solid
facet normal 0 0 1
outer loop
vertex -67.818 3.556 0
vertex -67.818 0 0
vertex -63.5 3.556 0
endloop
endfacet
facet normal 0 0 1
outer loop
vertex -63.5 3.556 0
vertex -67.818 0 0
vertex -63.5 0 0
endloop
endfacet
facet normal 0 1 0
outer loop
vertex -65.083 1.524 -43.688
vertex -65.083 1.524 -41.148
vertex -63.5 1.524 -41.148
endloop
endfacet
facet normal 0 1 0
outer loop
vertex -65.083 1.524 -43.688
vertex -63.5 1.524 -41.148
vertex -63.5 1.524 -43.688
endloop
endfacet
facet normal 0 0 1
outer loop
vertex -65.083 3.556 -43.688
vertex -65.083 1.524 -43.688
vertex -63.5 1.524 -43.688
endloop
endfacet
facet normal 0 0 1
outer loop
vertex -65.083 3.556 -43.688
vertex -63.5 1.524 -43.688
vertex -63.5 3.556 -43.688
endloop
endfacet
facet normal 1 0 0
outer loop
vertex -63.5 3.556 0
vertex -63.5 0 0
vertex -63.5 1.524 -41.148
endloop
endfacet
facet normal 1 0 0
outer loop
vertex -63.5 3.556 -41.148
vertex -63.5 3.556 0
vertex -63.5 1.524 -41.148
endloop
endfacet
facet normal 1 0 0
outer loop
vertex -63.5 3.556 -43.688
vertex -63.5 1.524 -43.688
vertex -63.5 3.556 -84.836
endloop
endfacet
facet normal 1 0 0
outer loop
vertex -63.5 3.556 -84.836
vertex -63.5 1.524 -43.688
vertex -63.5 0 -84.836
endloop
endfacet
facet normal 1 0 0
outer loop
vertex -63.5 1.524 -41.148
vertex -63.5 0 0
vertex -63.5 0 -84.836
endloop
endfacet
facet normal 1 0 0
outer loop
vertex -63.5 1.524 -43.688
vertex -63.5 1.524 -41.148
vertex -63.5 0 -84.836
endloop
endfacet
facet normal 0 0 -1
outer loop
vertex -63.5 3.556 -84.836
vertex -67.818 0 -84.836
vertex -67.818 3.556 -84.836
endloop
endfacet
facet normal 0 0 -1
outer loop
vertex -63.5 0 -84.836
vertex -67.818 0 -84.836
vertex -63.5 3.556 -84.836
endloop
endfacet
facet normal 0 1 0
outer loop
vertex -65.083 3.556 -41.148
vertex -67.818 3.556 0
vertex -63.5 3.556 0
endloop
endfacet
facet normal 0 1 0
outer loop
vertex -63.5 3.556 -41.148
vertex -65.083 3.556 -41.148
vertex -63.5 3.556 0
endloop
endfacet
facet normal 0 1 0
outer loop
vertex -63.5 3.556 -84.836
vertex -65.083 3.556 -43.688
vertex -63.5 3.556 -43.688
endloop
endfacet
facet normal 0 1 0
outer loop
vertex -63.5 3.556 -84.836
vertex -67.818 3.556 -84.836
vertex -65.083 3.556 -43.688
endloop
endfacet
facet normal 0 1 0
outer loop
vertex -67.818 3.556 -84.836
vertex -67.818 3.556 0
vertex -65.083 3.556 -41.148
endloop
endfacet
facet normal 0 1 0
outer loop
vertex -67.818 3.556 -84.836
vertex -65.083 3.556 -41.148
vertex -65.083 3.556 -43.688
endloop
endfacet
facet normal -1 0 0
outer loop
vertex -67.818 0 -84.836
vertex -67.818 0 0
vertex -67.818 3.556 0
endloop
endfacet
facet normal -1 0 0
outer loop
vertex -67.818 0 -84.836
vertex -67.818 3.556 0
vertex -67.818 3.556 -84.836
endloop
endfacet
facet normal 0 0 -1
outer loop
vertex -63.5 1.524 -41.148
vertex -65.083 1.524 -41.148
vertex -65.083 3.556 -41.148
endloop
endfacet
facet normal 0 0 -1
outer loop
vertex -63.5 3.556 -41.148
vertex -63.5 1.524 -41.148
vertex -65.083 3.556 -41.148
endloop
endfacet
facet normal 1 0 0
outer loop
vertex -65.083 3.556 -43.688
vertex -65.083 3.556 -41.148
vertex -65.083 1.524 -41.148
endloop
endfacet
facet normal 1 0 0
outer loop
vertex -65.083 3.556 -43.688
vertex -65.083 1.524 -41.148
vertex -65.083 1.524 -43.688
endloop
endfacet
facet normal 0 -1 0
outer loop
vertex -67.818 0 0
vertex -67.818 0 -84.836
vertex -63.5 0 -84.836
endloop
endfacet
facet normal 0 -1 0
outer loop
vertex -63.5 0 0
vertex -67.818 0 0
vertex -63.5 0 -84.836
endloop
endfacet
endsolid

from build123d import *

# Parameters (mm, degrees)
SKETCH1_W              = 4.318
SKETCH1_H              = 84.836
BOSS_EXTRUDE1_DEPTH    = 3.556
CUT_EXTRUDE2_START     = -1.583272769
CUT_EXTRUDE2_OUTLINE_W = 2.54
CUT_EXTRUDE2_OUTLINE_H = 2.032
CUT_EXTRUDE2_DEPTH     = 1.583272769


# Read off the part's stored shape, not the designer's step: Cut-Extrude2
with BuildPart() as part:
    # Sketch1 → Boss-Extrude1 (new body)
    with BuildSketch(Plane(origin=(0, 0, 0), x_dir=(1, 0, 0), z_dir=(0, 1, 0))):
        with Locations((-65.659, 42.418)):
            Rectangle(SKETCH1_W, SKETCH1_H)
    extrude(amount=BOSS_EXTRUDE1_DEPTH)

    # Cut-Extrude2 outline → Cut-Extrude2 (cut)
    with BuildSketch(Plane(origin=(-63.5, 0, 0), x_dir=(0, 0, -1), z_dir=(1, 0, 0)).offset(CUT_EXTRUDE2_START)):
        with Locations((42.418, 2.54)):
            Rectangle(CUT_EXTRUDE2_OUTLINE_W, CUT_EXTRUDE2_OUTLINE_H)
    extrude(amount=CUT_EXTRUDE2_DEPTH, mode=Mode.SUBTRACT)


solid = part.part
